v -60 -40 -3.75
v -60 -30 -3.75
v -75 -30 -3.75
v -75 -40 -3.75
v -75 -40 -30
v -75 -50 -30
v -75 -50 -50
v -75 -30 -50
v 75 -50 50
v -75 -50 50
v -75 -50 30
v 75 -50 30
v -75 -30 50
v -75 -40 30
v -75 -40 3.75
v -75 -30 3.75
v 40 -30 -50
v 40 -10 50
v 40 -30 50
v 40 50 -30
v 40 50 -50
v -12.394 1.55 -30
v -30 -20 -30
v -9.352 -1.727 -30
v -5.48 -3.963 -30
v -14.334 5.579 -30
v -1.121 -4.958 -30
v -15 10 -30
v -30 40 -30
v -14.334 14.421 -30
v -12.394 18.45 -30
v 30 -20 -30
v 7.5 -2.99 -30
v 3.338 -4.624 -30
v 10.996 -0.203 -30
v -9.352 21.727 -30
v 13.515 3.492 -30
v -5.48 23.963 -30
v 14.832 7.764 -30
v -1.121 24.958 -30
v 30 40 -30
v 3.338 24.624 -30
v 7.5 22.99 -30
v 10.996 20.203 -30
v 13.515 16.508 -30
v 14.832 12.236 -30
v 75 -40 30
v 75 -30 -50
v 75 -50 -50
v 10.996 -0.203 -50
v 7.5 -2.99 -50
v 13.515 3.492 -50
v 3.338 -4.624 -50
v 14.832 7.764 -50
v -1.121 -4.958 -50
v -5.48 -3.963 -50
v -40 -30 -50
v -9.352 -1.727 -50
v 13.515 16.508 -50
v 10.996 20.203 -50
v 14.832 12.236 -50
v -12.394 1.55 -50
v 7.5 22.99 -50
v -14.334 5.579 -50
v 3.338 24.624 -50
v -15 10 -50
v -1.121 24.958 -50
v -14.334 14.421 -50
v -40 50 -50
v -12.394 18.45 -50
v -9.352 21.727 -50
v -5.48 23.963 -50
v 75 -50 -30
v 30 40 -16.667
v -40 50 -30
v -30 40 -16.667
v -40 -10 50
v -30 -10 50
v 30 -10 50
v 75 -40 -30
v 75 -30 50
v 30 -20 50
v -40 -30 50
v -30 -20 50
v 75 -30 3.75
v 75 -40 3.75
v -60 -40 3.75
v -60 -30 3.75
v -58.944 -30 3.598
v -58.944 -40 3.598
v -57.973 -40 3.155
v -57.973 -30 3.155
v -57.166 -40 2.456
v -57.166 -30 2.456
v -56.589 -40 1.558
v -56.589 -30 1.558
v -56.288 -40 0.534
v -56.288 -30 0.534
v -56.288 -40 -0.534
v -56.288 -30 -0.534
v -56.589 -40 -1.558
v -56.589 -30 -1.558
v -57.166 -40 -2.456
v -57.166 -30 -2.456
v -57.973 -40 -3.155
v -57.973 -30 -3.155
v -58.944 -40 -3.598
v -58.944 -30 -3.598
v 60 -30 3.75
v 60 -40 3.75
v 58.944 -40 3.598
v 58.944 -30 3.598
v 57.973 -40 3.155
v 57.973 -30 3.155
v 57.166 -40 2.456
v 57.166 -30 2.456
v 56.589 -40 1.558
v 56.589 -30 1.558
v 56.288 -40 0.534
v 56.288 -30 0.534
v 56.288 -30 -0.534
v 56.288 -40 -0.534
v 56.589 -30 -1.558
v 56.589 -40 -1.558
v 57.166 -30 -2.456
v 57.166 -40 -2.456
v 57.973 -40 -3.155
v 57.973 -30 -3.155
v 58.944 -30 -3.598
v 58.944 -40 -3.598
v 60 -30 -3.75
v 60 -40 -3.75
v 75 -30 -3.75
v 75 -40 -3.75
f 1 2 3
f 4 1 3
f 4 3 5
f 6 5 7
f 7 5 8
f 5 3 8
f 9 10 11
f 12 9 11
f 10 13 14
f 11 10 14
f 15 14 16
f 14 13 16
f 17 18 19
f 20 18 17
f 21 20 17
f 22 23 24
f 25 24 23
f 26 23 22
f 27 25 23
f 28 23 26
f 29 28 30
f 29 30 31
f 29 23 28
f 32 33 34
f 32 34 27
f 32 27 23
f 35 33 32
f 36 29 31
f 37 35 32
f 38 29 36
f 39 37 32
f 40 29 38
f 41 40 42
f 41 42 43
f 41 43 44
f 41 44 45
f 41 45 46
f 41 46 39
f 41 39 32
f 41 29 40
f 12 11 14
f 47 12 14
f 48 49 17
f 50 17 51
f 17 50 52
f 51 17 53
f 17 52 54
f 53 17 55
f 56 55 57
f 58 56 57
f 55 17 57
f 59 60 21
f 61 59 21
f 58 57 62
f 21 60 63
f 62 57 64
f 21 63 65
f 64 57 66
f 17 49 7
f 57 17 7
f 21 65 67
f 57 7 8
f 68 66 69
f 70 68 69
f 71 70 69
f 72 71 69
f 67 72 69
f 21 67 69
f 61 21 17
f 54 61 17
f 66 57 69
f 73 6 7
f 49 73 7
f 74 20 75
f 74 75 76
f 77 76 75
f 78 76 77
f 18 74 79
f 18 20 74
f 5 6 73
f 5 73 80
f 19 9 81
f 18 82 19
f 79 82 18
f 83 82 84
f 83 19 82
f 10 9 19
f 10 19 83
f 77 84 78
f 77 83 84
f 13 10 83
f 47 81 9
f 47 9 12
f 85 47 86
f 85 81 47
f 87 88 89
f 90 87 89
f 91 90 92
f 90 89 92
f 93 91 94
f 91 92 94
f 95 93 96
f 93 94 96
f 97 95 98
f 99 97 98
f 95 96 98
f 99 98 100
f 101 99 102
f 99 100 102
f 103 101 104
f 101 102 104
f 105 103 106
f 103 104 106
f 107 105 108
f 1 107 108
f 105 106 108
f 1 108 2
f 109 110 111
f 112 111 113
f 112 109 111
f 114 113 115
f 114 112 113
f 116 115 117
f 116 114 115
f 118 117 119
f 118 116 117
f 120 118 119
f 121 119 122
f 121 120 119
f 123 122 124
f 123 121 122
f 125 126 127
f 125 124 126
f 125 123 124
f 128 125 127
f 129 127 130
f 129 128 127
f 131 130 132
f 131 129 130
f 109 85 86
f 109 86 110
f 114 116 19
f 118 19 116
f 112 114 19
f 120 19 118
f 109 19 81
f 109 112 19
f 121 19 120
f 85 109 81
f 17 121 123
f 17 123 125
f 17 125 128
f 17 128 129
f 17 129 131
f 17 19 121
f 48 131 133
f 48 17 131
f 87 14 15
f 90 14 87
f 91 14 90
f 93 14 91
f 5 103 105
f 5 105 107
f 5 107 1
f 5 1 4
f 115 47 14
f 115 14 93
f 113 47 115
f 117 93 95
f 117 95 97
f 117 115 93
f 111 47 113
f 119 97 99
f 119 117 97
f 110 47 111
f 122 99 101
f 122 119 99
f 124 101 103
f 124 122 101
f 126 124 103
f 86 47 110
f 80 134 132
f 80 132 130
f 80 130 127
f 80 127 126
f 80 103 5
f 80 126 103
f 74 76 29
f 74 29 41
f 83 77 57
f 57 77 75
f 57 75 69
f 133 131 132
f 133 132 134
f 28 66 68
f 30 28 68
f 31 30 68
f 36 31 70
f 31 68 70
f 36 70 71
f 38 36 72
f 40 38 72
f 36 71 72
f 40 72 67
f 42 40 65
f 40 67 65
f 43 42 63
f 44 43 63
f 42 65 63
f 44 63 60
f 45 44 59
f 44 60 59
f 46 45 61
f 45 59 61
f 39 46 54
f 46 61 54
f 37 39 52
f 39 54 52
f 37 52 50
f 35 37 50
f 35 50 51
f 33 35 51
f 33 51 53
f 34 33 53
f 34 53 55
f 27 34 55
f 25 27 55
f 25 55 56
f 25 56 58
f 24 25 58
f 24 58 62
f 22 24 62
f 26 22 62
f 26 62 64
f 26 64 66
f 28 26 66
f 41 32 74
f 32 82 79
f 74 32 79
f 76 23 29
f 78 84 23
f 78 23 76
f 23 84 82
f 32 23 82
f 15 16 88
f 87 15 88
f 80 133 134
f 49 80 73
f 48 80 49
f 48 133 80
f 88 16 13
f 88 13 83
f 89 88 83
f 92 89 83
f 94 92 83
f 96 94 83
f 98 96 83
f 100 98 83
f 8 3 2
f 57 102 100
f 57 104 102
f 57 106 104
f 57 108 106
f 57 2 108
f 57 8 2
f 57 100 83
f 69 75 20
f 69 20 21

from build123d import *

# Parameters (mm, degrees)
BOSS_EXTRUDE1_DEPTH      = 75
BOSS_EXTRUDE1_DEPTH_BACK = 75
SKETCH1_W                = 100
SKETCH1_H                = 100
SKETCH2_W                = 35
SKETCH2_H                = 100
CUT_EXTRUDE1_DEPTH       = 80
CUT_EXTRUDE2_DEPTH       = 136
SKETCH5_W                = 60
SKETCH5_H                = 60
CUT_EXTRUDE3_DEPTH       = 80
SKETCH6_W                = 60
SKETCH6_H                = 10
CUT_EXTRUDE5_DEPTH       = 166.831239518
CUT_EXTRUDE6_DEPTH       = 121.519707932
HOLE1_D                  = 30


with BuildPart() as part:
    # Sketch1 → Boss-Extrude1 (new, two sides: drawn at the far end of the back side and taken through both)
    with BuildSketch(Plane(origin=(0, 0, 0), x_dir=(0, 0, -1), z_dir=(1, 0, 0)).offset(-BOSS_EXTRUDE1_DEPTH_BACK)):
        Rectangle(SKETCH1_W, SKETCH1_H)
    extrude(amount=BOSS_EXTRUDE1_DEPTH + BOSS_EXTRUDE1_DEPTH_BACK)

    # Sketch2 → Cut-Extrude1 (cut)
    with BuildSketch(Plane(origin=(0, 50, 0), x_dir=(1, 0, 0), z_dir=(0, 1, 0))):
        with Locations((57.5, 0)):
            Rectangle(SKETCH2_W, SKETCH2_H)
        with Locations((-57.5, 0)):
            Rectangle(SKETCH2_W, SKETCH2_H)
    extrude(amount=-CUT_EXTRUDE1_DEPTH, mode=Mode.SUBTRACT)

    # Sketch3 → Cut-Extrude2 (cut, through all)
    with BuildSketch(Plane(origin=(40, 0, 0), x_dir=(0, 0, -1), z_dir=(1, 0, 0))):
        Polygon((30, 50), (-50, -10), (-50, 50), align=None)
    extrude(amount=-CUT_EXTRUDE2_DEPTH, mode=Mode.SUBTRACT)

    # Sketch5 → Cut-Extrude3 (cut)
    with BuildSketch(Plane.XY.offset(50)):
        with Locations((0, 10)):
            Rectangle(SKETCH5_W, SKETCH5_H)
    extrude(amount=-CUT_EXTRUDE3_DEPTH, mode=Mode.SUBTRACT)

    # Sketch6 → Cut-Extrude5 (cut, through all)
    with BuildSketch(Plane(origin=(75, 0, 0), x_dir=(0, 0, -1), z_dir=(1, 0, 0))):
        with Locations((0, -45)):
            Rectangle(SKETCH6_W, SKETCH6_H)
    extrude(amount=-CUT_EXTRUDE5_DEPTH, mode=Mode.SUBTRACT)

    # Sketch7 → Cut-Extrude6 (cut, through all)
    with BuildSketch(Plane(origin=(0, -30, 0), x_dir=(1, 0, 0), z_dir=(0, 1, 0))):
        with BuildLine():
            Line((59.99999901, 3.75), (75, 3.75))
            Line((75, 3.75), (75, -3.75))
            Line((75, -3.75), (60, -3.75))
            ThreePointArc((60, -3.75), (56.25, -4.95e-07), (59.99999901, 3.75))
        make_face()
    cut_extrude6 = extrude(amount=-CUT_EXTRUDE6_DEPTH, mode=Mode.SUBTRACT)

    # Mirror1: Cut-Extrude6 across plane
    add(cut_extrude6.mirror(Plane(origin=(0, 0, 0), x_dir=(0, 0, 1), z_dir=(1, 0, 0))), mode=Mode.SUBTRACT)

    # Hole1 (through all)
    with Locations(Plane.XY.offset(-30)):
        with Locations((0, 10)):
            Hole(HOLE1_D / 2)


solid = part.part
